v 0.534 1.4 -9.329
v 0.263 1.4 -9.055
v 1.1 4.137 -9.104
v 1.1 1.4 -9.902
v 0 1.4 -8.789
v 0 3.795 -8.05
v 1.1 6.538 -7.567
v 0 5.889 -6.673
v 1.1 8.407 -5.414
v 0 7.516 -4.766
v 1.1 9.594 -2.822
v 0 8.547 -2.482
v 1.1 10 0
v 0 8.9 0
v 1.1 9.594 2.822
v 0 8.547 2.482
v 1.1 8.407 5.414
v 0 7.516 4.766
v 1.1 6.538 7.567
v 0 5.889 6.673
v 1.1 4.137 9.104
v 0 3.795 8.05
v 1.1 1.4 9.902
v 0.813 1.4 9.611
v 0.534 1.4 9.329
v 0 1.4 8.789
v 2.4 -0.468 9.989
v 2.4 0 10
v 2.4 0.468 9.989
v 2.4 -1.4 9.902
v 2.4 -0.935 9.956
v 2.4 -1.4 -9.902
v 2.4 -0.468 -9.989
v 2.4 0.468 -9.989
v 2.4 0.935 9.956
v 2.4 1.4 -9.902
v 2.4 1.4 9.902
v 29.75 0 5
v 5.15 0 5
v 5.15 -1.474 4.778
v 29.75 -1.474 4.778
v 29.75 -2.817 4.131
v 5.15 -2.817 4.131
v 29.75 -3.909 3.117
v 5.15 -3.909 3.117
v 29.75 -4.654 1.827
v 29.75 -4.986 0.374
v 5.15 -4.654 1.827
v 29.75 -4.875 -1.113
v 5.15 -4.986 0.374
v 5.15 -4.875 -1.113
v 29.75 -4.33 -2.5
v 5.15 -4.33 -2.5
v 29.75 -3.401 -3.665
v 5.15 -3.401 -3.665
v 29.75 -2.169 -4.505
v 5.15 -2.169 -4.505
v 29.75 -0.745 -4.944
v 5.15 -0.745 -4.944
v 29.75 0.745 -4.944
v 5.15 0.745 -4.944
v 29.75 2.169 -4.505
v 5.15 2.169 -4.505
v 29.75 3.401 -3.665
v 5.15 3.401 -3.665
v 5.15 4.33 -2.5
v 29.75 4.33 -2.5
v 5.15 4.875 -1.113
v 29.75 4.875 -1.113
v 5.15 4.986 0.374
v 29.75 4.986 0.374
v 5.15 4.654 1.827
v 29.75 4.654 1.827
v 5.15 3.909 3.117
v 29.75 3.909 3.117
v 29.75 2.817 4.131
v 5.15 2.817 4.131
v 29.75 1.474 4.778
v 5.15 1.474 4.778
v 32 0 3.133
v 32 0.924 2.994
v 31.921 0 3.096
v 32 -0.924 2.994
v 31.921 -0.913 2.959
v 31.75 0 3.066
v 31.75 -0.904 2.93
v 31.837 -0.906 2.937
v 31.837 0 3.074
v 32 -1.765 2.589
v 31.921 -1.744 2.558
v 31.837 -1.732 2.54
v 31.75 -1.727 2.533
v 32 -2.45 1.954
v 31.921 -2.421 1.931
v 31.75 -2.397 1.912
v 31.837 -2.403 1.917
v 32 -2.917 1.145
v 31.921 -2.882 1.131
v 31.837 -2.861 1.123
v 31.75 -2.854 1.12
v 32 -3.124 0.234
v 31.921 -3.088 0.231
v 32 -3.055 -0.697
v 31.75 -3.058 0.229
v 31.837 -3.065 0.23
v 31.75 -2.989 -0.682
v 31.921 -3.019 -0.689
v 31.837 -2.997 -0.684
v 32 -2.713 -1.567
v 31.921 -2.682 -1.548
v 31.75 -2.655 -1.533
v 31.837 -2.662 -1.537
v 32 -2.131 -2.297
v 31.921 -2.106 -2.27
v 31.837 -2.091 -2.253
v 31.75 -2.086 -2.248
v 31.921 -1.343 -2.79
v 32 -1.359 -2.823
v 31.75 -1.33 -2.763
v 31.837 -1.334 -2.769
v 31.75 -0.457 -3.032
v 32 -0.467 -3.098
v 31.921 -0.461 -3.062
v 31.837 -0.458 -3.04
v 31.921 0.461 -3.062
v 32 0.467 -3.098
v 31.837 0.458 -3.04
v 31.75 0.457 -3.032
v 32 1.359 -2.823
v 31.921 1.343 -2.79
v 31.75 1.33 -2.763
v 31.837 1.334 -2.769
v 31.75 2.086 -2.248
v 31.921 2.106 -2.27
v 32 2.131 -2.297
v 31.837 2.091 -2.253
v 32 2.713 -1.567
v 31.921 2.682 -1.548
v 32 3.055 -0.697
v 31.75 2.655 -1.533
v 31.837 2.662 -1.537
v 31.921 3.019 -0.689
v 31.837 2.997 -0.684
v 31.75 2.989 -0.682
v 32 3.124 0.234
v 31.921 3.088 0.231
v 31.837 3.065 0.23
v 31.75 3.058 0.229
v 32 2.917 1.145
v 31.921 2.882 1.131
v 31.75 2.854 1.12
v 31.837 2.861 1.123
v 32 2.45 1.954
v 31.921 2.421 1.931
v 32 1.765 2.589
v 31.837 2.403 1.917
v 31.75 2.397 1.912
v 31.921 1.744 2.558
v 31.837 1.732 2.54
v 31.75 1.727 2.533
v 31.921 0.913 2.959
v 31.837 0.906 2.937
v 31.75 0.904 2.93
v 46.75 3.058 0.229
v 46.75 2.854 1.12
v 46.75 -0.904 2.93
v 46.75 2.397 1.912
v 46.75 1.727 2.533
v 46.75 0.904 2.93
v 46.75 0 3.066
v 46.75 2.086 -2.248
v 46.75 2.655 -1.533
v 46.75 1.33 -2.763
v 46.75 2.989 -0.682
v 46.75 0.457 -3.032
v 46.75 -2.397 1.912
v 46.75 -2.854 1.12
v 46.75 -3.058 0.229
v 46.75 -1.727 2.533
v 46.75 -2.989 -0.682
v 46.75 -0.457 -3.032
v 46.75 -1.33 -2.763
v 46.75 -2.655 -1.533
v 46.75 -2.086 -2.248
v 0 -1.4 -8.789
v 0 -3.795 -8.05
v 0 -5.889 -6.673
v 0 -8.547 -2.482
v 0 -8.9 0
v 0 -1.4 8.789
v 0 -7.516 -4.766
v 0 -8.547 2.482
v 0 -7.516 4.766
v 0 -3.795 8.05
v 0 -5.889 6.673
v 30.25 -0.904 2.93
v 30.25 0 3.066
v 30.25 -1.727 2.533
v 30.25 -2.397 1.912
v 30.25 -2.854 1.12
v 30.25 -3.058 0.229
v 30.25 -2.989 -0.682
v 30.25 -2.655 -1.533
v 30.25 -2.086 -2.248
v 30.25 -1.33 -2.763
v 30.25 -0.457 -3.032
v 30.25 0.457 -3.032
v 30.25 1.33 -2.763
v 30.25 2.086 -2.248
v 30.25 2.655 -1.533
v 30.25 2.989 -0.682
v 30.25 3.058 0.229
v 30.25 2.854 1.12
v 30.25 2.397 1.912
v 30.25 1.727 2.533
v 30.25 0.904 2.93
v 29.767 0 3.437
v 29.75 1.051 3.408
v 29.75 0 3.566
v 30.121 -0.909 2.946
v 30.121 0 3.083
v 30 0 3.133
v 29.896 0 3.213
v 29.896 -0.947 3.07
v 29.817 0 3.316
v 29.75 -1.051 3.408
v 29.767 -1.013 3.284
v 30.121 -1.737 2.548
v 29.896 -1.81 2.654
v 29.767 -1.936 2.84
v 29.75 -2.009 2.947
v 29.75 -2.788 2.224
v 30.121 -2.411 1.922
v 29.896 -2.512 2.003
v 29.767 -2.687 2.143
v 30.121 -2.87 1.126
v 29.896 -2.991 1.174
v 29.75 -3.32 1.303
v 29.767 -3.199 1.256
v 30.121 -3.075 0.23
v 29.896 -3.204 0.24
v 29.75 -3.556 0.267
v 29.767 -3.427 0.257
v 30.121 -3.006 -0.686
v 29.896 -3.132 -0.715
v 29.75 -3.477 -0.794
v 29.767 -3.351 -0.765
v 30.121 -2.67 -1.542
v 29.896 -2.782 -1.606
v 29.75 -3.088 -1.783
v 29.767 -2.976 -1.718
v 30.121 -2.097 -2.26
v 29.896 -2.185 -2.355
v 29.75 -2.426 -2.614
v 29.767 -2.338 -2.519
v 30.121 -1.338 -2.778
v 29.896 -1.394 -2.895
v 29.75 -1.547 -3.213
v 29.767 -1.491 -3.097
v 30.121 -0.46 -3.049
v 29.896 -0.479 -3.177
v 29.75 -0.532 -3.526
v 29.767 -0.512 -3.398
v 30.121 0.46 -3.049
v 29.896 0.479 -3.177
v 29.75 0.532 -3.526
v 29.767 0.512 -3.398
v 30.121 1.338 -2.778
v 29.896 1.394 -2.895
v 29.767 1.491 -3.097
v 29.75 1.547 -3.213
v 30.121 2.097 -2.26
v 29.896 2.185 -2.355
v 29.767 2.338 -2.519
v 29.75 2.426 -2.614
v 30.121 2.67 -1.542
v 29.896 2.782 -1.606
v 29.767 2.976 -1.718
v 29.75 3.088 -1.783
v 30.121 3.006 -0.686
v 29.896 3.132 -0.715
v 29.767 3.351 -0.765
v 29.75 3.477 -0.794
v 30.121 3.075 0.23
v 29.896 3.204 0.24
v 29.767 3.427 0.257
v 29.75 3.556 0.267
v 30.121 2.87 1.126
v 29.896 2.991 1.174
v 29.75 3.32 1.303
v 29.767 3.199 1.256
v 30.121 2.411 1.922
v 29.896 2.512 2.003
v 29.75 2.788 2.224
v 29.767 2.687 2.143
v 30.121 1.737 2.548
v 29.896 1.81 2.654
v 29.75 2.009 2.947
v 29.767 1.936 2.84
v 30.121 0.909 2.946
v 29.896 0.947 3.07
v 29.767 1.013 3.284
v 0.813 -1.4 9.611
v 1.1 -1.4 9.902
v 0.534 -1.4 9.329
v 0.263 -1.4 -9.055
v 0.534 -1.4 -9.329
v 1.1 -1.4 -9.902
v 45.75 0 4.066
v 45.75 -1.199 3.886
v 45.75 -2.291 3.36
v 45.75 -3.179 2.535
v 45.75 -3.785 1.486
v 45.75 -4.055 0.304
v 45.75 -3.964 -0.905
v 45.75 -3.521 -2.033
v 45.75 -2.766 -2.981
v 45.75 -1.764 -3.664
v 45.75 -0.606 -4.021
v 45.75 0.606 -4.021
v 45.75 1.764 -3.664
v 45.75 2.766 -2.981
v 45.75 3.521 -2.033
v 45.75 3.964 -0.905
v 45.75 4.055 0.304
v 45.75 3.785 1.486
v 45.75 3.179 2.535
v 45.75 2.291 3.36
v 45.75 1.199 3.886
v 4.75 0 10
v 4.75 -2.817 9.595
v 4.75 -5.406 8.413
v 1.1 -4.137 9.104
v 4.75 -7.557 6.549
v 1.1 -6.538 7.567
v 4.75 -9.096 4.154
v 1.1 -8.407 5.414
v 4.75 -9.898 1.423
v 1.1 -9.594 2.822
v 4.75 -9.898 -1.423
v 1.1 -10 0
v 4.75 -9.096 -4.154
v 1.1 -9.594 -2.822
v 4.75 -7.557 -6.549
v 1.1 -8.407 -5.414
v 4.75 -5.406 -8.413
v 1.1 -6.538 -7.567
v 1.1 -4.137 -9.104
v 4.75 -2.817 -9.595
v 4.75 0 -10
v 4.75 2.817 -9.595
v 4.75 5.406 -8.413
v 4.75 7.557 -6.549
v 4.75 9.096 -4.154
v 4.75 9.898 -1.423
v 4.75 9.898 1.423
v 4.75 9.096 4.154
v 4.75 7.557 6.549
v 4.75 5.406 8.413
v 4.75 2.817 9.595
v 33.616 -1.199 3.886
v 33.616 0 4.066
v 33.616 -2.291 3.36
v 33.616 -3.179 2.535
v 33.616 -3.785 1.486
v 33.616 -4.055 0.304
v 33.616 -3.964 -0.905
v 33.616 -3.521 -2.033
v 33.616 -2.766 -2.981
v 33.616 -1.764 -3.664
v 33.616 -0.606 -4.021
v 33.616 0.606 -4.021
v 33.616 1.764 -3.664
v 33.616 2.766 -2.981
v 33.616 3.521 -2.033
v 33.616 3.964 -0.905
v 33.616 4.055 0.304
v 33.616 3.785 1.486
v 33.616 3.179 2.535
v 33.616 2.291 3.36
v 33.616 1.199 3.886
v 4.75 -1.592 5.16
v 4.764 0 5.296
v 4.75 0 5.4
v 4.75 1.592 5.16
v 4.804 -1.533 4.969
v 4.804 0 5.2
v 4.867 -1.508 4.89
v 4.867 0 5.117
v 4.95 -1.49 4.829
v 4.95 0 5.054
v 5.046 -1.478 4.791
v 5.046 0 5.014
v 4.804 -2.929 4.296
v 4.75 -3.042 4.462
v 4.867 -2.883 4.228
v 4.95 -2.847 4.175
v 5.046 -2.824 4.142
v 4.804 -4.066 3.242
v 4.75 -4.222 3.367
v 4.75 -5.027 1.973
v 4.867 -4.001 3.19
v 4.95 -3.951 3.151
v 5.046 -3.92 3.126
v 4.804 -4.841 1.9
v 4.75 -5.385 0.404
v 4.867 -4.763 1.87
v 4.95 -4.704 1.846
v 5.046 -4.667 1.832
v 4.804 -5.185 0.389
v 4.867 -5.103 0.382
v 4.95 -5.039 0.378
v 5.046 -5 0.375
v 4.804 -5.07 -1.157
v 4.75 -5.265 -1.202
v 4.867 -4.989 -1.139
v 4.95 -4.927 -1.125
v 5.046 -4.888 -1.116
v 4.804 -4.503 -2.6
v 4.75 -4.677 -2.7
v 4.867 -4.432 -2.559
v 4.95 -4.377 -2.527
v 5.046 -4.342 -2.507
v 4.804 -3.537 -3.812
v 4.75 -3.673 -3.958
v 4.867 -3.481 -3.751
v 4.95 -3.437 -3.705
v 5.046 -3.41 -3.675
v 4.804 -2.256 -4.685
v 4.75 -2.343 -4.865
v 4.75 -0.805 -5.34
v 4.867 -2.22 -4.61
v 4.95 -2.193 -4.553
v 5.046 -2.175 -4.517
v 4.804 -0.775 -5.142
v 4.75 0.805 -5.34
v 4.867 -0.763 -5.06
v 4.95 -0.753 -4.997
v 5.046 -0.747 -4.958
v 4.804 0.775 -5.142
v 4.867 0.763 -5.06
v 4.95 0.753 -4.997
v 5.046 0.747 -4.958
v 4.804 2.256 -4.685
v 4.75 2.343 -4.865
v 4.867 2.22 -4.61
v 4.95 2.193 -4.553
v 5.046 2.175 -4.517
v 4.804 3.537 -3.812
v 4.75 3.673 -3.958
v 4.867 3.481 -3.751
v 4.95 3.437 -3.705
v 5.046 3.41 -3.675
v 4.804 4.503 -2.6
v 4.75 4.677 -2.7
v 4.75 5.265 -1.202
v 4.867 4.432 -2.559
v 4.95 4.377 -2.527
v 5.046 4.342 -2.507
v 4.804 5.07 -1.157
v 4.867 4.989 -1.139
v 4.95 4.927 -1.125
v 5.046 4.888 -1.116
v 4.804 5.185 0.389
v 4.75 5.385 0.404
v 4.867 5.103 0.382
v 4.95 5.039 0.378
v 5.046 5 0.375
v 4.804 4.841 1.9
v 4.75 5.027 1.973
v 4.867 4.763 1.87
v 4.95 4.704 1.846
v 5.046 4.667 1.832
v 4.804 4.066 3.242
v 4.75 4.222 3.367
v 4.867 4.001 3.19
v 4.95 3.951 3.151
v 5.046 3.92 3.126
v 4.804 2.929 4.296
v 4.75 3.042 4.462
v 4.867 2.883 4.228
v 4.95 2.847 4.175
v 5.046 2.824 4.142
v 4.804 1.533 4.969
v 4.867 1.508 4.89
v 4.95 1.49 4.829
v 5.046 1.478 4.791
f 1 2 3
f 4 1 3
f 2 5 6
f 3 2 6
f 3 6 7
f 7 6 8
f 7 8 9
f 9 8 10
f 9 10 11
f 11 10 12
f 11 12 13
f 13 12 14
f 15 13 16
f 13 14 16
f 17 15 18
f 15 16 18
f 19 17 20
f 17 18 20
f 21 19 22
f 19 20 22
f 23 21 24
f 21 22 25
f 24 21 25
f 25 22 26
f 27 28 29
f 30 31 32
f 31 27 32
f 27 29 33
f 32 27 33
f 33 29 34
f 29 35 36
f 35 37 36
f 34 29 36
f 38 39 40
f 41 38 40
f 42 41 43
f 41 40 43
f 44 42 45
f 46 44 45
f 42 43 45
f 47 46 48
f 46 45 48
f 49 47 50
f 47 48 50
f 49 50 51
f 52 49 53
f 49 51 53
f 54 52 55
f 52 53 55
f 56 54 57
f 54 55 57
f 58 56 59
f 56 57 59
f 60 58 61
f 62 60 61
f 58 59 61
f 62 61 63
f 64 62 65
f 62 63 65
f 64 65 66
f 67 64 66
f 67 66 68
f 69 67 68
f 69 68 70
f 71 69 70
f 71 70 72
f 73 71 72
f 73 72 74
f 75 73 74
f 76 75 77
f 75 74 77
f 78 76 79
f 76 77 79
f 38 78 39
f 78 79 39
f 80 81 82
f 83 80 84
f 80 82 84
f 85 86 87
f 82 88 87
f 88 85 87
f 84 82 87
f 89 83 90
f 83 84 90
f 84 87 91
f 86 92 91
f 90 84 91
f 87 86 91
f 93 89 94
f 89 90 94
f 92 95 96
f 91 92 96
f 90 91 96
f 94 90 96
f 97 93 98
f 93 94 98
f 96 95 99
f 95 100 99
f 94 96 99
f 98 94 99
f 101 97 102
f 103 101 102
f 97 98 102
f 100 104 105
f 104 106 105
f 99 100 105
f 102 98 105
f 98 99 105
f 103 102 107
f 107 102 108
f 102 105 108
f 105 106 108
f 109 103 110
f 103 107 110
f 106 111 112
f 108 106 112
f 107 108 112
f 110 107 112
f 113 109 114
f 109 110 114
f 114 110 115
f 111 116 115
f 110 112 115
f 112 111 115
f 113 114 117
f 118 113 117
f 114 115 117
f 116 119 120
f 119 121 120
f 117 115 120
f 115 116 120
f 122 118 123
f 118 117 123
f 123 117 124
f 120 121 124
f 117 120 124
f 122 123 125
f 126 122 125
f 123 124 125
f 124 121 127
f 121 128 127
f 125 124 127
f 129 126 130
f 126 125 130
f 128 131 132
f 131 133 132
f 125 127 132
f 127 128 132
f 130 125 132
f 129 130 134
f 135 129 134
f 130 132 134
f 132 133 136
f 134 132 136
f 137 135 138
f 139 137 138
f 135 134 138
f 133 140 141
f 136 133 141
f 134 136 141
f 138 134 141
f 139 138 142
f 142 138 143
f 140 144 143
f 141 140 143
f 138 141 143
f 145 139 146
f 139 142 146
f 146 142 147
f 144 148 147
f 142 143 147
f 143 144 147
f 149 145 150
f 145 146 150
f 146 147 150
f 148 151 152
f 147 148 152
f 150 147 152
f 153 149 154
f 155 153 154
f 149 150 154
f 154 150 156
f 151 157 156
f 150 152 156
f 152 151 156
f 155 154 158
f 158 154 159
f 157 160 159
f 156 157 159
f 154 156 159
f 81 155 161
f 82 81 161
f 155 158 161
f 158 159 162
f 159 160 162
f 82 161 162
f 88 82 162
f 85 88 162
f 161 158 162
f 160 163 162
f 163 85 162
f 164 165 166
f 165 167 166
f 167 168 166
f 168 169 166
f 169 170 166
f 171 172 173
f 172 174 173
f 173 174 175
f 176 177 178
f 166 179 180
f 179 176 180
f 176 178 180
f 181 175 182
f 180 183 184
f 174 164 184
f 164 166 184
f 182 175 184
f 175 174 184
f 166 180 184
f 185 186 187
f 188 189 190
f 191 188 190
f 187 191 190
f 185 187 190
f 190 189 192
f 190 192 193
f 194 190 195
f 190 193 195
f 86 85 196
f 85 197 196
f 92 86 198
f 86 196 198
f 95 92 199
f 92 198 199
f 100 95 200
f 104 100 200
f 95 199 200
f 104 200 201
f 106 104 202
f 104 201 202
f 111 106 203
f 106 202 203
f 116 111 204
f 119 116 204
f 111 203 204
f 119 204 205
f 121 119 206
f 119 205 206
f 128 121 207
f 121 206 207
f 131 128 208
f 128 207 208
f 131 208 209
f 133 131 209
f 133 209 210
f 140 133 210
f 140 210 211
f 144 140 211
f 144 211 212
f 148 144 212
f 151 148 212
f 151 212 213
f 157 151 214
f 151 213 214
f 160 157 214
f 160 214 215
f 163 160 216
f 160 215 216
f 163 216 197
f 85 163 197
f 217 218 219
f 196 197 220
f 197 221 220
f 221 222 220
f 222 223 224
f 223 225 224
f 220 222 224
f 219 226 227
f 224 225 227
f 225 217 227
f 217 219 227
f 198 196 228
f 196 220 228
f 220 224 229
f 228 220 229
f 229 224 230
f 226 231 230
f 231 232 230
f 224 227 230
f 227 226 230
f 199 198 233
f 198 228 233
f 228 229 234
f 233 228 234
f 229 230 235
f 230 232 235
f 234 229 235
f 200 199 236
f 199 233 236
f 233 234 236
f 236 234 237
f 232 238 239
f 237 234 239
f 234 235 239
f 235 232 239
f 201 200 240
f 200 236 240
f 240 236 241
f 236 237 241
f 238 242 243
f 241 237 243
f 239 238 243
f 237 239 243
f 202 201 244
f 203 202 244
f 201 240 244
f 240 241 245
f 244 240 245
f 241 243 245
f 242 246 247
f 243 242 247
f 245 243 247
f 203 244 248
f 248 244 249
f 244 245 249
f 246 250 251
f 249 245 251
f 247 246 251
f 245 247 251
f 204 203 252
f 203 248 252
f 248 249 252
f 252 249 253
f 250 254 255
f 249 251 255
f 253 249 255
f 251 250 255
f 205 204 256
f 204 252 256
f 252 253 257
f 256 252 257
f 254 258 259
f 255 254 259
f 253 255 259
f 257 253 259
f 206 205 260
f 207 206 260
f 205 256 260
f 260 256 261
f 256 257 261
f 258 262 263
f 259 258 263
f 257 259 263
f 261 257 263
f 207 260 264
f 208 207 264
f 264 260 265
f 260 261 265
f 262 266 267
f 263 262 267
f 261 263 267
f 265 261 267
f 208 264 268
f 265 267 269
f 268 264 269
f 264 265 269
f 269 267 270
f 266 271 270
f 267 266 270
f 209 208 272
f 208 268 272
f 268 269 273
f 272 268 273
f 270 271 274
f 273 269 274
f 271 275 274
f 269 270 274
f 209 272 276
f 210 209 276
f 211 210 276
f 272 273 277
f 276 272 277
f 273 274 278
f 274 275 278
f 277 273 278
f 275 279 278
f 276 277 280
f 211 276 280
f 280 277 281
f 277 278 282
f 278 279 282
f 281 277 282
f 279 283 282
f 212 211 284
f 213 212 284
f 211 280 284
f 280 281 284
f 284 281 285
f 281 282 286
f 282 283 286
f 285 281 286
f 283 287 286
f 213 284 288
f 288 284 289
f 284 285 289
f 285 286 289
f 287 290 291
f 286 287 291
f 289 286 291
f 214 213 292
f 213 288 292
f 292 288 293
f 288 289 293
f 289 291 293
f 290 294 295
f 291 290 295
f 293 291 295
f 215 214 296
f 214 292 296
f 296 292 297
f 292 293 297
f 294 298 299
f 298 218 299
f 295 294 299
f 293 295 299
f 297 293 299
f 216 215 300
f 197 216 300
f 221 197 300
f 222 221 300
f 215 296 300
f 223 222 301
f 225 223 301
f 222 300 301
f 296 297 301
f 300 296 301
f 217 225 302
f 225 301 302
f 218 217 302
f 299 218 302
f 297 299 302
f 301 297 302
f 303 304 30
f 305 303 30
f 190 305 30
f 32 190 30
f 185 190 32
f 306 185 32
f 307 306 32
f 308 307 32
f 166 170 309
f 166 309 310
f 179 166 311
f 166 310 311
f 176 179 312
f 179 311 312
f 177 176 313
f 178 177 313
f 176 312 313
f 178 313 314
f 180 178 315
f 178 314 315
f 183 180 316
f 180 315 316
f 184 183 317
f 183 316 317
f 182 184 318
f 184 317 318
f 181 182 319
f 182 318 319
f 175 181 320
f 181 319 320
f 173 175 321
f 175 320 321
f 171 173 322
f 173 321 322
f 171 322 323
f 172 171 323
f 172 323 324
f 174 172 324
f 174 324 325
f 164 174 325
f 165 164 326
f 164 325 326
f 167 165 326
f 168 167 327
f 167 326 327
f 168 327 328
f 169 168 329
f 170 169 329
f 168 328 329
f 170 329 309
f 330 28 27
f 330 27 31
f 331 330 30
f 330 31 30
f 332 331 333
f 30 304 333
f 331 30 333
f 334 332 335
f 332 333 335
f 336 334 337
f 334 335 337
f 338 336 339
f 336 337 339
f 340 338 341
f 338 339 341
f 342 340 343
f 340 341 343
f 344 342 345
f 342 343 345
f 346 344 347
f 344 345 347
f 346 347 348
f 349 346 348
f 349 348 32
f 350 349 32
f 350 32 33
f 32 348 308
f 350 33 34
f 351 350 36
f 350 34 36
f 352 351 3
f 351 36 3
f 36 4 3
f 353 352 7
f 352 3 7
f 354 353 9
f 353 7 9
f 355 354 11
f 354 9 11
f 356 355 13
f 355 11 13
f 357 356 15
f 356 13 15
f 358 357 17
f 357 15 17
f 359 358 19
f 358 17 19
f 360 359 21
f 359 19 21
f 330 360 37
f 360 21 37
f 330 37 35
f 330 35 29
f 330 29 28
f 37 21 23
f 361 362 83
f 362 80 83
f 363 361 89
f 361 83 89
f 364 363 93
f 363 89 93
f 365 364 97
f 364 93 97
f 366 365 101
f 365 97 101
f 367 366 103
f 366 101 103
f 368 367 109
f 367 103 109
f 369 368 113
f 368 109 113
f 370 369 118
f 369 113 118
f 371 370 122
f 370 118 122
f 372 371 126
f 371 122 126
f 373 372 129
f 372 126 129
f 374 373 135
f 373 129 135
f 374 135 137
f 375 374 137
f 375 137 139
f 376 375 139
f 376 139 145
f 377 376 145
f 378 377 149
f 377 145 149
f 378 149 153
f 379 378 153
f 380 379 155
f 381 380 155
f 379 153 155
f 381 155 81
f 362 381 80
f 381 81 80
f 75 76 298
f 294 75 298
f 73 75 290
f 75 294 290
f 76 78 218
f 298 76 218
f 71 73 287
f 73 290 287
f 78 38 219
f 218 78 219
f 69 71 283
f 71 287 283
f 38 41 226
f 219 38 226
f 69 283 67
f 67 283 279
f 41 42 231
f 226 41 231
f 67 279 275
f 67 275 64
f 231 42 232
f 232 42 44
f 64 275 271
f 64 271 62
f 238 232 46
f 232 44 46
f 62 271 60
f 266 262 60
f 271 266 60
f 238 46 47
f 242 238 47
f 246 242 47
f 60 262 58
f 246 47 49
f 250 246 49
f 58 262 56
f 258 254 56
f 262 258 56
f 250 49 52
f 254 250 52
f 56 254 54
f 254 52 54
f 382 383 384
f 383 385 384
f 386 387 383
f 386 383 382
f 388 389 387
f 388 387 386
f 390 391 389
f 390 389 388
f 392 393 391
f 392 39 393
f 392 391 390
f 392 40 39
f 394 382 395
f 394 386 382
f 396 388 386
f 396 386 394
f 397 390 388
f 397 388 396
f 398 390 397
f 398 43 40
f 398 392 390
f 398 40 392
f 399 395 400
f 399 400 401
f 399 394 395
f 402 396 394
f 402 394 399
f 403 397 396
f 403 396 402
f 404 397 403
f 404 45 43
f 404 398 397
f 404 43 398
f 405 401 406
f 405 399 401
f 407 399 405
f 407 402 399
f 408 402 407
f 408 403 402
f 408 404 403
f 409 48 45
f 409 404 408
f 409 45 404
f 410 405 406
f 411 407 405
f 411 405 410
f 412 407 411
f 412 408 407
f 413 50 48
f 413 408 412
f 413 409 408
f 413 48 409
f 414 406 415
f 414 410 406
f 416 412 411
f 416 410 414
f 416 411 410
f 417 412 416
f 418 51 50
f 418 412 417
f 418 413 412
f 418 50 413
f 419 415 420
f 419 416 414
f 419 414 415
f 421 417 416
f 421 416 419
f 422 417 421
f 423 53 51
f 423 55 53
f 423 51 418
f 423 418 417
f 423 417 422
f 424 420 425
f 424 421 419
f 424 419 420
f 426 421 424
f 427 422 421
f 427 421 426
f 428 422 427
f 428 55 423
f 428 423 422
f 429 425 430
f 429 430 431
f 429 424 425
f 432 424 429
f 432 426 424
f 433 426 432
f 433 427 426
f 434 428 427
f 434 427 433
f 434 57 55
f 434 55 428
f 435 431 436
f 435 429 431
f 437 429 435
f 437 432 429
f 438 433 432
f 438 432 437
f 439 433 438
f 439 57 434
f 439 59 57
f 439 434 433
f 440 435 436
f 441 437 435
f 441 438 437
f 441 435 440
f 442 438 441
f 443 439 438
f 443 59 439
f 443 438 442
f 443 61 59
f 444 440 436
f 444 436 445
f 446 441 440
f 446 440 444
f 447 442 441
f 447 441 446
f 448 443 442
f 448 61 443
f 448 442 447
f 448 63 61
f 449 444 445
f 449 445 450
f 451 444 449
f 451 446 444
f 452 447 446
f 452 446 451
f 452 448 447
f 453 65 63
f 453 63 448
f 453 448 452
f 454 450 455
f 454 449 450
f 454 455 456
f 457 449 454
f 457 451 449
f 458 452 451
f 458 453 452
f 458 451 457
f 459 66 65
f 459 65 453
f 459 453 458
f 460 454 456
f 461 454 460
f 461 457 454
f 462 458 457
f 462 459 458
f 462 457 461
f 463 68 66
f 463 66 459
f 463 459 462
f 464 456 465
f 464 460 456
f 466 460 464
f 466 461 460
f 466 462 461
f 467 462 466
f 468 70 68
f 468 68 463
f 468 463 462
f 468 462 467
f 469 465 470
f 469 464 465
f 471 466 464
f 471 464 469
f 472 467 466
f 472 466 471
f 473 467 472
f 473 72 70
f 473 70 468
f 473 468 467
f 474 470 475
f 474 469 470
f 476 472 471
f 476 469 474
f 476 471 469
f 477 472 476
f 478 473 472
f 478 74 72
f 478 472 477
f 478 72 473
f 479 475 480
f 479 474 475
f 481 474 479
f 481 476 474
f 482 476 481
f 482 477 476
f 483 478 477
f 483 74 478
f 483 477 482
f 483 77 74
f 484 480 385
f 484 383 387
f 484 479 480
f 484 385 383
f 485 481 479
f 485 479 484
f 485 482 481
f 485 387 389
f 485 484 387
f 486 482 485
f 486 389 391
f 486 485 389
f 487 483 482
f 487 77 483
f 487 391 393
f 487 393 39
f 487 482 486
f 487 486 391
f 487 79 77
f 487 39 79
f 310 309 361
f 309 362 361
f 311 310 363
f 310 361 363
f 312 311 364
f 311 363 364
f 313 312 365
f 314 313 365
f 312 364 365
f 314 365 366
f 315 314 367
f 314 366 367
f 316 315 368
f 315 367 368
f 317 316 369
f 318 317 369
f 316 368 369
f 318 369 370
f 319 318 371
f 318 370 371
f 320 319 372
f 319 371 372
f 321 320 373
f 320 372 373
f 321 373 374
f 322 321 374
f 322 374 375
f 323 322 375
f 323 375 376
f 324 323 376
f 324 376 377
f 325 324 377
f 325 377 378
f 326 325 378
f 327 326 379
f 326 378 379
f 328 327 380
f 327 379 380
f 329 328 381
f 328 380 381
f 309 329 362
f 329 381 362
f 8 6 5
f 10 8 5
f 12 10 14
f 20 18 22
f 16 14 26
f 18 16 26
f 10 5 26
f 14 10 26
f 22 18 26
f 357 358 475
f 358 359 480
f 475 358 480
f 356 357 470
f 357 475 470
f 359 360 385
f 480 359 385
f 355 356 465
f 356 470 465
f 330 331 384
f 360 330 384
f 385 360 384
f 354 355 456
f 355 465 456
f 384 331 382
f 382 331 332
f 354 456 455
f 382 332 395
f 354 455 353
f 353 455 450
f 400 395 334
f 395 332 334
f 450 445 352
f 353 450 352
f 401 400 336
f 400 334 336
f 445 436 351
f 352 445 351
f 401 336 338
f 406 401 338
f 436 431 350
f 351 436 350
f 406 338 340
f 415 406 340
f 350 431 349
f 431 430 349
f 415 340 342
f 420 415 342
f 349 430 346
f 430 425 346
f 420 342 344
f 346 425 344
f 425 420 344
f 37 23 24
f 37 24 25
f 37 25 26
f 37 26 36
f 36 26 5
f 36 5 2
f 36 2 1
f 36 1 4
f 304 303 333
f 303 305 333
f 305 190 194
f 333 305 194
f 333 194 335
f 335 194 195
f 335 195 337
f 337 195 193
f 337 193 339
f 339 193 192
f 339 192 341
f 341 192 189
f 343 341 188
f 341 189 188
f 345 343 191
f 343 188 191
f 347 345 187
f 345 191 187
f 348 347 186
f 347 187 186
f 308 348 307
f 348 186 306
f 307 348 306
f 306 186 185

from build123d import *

# Parameters (mm, degrees)
FILLET1_R  = 0.4
SKETCH2_W  = 20
SKETCH2_H  = 2.8
SLOT_DEPTH = 2.4


with BuildPart() as part:
    # BodySke → Base-Revolve (revolve)
    with BuildSketch(Plane.XY, mode=Mode.PRIVATE) as base_revolve_sk:
        with BuildLine():
            Line((4.75, 5), (4.75, 10))
            Line((4.75, 10), (1.1, 10))
            Line((1.1, 10), (0, 8.9))
            Line((0, 8.9), (0, 0))
            Line((0, 0), (46.75, 0))
            Line((46.75, 0), (46.75, 3.066266942))
            Line((46.75, 3.066266942), (45.75, 4.066266942))
            Line((45.75, 4.066266942), (33.616025404, 4.066266942))
            Line((33.616025404, 4.066266942), (32, 3.133254241))
            ThreePointArc((32, 3.133254241), (31.879409523, 3.083304029), (31.75, 3.066266942))
            Line((31.75, 3.066266942), (30.25, 3.066266942))
            ThreePointArc((30.25, 3.066266942), (29.896446609, 3.212713552), (29.75, 3.566266942))
            Line((29.75, 3.566266942), (29.75, 5))
            Line((29.75, 5), (4.75, 5))
        make_face()
    revolve(base_revolve_sk.sketch.rotate(Axis((-25.4, 0, 0), (1, 0, 0)), 90), axis=Axis((-25.4, 0, 0), (1, 0, 0)))

    # Fillet1
    fillet1_edges = [part.edges().sort_by_distance(p)[0] for p in [
        (4.75, 0, -5),
    ]]
    fillet(fillet1_edges, radius=FILLET1_R)

    # Sketch2 → Slot (cut)
    with BuildSketch(Plane(origin=(0, 0, 0), x_dir=(0, 0, -1), z_dir=(1, 0, 0))):
        Rectangle(SKETCH2_W, SKETCH2_H)
    extrude(amount=SLOT_DEPTH, mode=Mode.SUBTRACT)


solid = part.part
